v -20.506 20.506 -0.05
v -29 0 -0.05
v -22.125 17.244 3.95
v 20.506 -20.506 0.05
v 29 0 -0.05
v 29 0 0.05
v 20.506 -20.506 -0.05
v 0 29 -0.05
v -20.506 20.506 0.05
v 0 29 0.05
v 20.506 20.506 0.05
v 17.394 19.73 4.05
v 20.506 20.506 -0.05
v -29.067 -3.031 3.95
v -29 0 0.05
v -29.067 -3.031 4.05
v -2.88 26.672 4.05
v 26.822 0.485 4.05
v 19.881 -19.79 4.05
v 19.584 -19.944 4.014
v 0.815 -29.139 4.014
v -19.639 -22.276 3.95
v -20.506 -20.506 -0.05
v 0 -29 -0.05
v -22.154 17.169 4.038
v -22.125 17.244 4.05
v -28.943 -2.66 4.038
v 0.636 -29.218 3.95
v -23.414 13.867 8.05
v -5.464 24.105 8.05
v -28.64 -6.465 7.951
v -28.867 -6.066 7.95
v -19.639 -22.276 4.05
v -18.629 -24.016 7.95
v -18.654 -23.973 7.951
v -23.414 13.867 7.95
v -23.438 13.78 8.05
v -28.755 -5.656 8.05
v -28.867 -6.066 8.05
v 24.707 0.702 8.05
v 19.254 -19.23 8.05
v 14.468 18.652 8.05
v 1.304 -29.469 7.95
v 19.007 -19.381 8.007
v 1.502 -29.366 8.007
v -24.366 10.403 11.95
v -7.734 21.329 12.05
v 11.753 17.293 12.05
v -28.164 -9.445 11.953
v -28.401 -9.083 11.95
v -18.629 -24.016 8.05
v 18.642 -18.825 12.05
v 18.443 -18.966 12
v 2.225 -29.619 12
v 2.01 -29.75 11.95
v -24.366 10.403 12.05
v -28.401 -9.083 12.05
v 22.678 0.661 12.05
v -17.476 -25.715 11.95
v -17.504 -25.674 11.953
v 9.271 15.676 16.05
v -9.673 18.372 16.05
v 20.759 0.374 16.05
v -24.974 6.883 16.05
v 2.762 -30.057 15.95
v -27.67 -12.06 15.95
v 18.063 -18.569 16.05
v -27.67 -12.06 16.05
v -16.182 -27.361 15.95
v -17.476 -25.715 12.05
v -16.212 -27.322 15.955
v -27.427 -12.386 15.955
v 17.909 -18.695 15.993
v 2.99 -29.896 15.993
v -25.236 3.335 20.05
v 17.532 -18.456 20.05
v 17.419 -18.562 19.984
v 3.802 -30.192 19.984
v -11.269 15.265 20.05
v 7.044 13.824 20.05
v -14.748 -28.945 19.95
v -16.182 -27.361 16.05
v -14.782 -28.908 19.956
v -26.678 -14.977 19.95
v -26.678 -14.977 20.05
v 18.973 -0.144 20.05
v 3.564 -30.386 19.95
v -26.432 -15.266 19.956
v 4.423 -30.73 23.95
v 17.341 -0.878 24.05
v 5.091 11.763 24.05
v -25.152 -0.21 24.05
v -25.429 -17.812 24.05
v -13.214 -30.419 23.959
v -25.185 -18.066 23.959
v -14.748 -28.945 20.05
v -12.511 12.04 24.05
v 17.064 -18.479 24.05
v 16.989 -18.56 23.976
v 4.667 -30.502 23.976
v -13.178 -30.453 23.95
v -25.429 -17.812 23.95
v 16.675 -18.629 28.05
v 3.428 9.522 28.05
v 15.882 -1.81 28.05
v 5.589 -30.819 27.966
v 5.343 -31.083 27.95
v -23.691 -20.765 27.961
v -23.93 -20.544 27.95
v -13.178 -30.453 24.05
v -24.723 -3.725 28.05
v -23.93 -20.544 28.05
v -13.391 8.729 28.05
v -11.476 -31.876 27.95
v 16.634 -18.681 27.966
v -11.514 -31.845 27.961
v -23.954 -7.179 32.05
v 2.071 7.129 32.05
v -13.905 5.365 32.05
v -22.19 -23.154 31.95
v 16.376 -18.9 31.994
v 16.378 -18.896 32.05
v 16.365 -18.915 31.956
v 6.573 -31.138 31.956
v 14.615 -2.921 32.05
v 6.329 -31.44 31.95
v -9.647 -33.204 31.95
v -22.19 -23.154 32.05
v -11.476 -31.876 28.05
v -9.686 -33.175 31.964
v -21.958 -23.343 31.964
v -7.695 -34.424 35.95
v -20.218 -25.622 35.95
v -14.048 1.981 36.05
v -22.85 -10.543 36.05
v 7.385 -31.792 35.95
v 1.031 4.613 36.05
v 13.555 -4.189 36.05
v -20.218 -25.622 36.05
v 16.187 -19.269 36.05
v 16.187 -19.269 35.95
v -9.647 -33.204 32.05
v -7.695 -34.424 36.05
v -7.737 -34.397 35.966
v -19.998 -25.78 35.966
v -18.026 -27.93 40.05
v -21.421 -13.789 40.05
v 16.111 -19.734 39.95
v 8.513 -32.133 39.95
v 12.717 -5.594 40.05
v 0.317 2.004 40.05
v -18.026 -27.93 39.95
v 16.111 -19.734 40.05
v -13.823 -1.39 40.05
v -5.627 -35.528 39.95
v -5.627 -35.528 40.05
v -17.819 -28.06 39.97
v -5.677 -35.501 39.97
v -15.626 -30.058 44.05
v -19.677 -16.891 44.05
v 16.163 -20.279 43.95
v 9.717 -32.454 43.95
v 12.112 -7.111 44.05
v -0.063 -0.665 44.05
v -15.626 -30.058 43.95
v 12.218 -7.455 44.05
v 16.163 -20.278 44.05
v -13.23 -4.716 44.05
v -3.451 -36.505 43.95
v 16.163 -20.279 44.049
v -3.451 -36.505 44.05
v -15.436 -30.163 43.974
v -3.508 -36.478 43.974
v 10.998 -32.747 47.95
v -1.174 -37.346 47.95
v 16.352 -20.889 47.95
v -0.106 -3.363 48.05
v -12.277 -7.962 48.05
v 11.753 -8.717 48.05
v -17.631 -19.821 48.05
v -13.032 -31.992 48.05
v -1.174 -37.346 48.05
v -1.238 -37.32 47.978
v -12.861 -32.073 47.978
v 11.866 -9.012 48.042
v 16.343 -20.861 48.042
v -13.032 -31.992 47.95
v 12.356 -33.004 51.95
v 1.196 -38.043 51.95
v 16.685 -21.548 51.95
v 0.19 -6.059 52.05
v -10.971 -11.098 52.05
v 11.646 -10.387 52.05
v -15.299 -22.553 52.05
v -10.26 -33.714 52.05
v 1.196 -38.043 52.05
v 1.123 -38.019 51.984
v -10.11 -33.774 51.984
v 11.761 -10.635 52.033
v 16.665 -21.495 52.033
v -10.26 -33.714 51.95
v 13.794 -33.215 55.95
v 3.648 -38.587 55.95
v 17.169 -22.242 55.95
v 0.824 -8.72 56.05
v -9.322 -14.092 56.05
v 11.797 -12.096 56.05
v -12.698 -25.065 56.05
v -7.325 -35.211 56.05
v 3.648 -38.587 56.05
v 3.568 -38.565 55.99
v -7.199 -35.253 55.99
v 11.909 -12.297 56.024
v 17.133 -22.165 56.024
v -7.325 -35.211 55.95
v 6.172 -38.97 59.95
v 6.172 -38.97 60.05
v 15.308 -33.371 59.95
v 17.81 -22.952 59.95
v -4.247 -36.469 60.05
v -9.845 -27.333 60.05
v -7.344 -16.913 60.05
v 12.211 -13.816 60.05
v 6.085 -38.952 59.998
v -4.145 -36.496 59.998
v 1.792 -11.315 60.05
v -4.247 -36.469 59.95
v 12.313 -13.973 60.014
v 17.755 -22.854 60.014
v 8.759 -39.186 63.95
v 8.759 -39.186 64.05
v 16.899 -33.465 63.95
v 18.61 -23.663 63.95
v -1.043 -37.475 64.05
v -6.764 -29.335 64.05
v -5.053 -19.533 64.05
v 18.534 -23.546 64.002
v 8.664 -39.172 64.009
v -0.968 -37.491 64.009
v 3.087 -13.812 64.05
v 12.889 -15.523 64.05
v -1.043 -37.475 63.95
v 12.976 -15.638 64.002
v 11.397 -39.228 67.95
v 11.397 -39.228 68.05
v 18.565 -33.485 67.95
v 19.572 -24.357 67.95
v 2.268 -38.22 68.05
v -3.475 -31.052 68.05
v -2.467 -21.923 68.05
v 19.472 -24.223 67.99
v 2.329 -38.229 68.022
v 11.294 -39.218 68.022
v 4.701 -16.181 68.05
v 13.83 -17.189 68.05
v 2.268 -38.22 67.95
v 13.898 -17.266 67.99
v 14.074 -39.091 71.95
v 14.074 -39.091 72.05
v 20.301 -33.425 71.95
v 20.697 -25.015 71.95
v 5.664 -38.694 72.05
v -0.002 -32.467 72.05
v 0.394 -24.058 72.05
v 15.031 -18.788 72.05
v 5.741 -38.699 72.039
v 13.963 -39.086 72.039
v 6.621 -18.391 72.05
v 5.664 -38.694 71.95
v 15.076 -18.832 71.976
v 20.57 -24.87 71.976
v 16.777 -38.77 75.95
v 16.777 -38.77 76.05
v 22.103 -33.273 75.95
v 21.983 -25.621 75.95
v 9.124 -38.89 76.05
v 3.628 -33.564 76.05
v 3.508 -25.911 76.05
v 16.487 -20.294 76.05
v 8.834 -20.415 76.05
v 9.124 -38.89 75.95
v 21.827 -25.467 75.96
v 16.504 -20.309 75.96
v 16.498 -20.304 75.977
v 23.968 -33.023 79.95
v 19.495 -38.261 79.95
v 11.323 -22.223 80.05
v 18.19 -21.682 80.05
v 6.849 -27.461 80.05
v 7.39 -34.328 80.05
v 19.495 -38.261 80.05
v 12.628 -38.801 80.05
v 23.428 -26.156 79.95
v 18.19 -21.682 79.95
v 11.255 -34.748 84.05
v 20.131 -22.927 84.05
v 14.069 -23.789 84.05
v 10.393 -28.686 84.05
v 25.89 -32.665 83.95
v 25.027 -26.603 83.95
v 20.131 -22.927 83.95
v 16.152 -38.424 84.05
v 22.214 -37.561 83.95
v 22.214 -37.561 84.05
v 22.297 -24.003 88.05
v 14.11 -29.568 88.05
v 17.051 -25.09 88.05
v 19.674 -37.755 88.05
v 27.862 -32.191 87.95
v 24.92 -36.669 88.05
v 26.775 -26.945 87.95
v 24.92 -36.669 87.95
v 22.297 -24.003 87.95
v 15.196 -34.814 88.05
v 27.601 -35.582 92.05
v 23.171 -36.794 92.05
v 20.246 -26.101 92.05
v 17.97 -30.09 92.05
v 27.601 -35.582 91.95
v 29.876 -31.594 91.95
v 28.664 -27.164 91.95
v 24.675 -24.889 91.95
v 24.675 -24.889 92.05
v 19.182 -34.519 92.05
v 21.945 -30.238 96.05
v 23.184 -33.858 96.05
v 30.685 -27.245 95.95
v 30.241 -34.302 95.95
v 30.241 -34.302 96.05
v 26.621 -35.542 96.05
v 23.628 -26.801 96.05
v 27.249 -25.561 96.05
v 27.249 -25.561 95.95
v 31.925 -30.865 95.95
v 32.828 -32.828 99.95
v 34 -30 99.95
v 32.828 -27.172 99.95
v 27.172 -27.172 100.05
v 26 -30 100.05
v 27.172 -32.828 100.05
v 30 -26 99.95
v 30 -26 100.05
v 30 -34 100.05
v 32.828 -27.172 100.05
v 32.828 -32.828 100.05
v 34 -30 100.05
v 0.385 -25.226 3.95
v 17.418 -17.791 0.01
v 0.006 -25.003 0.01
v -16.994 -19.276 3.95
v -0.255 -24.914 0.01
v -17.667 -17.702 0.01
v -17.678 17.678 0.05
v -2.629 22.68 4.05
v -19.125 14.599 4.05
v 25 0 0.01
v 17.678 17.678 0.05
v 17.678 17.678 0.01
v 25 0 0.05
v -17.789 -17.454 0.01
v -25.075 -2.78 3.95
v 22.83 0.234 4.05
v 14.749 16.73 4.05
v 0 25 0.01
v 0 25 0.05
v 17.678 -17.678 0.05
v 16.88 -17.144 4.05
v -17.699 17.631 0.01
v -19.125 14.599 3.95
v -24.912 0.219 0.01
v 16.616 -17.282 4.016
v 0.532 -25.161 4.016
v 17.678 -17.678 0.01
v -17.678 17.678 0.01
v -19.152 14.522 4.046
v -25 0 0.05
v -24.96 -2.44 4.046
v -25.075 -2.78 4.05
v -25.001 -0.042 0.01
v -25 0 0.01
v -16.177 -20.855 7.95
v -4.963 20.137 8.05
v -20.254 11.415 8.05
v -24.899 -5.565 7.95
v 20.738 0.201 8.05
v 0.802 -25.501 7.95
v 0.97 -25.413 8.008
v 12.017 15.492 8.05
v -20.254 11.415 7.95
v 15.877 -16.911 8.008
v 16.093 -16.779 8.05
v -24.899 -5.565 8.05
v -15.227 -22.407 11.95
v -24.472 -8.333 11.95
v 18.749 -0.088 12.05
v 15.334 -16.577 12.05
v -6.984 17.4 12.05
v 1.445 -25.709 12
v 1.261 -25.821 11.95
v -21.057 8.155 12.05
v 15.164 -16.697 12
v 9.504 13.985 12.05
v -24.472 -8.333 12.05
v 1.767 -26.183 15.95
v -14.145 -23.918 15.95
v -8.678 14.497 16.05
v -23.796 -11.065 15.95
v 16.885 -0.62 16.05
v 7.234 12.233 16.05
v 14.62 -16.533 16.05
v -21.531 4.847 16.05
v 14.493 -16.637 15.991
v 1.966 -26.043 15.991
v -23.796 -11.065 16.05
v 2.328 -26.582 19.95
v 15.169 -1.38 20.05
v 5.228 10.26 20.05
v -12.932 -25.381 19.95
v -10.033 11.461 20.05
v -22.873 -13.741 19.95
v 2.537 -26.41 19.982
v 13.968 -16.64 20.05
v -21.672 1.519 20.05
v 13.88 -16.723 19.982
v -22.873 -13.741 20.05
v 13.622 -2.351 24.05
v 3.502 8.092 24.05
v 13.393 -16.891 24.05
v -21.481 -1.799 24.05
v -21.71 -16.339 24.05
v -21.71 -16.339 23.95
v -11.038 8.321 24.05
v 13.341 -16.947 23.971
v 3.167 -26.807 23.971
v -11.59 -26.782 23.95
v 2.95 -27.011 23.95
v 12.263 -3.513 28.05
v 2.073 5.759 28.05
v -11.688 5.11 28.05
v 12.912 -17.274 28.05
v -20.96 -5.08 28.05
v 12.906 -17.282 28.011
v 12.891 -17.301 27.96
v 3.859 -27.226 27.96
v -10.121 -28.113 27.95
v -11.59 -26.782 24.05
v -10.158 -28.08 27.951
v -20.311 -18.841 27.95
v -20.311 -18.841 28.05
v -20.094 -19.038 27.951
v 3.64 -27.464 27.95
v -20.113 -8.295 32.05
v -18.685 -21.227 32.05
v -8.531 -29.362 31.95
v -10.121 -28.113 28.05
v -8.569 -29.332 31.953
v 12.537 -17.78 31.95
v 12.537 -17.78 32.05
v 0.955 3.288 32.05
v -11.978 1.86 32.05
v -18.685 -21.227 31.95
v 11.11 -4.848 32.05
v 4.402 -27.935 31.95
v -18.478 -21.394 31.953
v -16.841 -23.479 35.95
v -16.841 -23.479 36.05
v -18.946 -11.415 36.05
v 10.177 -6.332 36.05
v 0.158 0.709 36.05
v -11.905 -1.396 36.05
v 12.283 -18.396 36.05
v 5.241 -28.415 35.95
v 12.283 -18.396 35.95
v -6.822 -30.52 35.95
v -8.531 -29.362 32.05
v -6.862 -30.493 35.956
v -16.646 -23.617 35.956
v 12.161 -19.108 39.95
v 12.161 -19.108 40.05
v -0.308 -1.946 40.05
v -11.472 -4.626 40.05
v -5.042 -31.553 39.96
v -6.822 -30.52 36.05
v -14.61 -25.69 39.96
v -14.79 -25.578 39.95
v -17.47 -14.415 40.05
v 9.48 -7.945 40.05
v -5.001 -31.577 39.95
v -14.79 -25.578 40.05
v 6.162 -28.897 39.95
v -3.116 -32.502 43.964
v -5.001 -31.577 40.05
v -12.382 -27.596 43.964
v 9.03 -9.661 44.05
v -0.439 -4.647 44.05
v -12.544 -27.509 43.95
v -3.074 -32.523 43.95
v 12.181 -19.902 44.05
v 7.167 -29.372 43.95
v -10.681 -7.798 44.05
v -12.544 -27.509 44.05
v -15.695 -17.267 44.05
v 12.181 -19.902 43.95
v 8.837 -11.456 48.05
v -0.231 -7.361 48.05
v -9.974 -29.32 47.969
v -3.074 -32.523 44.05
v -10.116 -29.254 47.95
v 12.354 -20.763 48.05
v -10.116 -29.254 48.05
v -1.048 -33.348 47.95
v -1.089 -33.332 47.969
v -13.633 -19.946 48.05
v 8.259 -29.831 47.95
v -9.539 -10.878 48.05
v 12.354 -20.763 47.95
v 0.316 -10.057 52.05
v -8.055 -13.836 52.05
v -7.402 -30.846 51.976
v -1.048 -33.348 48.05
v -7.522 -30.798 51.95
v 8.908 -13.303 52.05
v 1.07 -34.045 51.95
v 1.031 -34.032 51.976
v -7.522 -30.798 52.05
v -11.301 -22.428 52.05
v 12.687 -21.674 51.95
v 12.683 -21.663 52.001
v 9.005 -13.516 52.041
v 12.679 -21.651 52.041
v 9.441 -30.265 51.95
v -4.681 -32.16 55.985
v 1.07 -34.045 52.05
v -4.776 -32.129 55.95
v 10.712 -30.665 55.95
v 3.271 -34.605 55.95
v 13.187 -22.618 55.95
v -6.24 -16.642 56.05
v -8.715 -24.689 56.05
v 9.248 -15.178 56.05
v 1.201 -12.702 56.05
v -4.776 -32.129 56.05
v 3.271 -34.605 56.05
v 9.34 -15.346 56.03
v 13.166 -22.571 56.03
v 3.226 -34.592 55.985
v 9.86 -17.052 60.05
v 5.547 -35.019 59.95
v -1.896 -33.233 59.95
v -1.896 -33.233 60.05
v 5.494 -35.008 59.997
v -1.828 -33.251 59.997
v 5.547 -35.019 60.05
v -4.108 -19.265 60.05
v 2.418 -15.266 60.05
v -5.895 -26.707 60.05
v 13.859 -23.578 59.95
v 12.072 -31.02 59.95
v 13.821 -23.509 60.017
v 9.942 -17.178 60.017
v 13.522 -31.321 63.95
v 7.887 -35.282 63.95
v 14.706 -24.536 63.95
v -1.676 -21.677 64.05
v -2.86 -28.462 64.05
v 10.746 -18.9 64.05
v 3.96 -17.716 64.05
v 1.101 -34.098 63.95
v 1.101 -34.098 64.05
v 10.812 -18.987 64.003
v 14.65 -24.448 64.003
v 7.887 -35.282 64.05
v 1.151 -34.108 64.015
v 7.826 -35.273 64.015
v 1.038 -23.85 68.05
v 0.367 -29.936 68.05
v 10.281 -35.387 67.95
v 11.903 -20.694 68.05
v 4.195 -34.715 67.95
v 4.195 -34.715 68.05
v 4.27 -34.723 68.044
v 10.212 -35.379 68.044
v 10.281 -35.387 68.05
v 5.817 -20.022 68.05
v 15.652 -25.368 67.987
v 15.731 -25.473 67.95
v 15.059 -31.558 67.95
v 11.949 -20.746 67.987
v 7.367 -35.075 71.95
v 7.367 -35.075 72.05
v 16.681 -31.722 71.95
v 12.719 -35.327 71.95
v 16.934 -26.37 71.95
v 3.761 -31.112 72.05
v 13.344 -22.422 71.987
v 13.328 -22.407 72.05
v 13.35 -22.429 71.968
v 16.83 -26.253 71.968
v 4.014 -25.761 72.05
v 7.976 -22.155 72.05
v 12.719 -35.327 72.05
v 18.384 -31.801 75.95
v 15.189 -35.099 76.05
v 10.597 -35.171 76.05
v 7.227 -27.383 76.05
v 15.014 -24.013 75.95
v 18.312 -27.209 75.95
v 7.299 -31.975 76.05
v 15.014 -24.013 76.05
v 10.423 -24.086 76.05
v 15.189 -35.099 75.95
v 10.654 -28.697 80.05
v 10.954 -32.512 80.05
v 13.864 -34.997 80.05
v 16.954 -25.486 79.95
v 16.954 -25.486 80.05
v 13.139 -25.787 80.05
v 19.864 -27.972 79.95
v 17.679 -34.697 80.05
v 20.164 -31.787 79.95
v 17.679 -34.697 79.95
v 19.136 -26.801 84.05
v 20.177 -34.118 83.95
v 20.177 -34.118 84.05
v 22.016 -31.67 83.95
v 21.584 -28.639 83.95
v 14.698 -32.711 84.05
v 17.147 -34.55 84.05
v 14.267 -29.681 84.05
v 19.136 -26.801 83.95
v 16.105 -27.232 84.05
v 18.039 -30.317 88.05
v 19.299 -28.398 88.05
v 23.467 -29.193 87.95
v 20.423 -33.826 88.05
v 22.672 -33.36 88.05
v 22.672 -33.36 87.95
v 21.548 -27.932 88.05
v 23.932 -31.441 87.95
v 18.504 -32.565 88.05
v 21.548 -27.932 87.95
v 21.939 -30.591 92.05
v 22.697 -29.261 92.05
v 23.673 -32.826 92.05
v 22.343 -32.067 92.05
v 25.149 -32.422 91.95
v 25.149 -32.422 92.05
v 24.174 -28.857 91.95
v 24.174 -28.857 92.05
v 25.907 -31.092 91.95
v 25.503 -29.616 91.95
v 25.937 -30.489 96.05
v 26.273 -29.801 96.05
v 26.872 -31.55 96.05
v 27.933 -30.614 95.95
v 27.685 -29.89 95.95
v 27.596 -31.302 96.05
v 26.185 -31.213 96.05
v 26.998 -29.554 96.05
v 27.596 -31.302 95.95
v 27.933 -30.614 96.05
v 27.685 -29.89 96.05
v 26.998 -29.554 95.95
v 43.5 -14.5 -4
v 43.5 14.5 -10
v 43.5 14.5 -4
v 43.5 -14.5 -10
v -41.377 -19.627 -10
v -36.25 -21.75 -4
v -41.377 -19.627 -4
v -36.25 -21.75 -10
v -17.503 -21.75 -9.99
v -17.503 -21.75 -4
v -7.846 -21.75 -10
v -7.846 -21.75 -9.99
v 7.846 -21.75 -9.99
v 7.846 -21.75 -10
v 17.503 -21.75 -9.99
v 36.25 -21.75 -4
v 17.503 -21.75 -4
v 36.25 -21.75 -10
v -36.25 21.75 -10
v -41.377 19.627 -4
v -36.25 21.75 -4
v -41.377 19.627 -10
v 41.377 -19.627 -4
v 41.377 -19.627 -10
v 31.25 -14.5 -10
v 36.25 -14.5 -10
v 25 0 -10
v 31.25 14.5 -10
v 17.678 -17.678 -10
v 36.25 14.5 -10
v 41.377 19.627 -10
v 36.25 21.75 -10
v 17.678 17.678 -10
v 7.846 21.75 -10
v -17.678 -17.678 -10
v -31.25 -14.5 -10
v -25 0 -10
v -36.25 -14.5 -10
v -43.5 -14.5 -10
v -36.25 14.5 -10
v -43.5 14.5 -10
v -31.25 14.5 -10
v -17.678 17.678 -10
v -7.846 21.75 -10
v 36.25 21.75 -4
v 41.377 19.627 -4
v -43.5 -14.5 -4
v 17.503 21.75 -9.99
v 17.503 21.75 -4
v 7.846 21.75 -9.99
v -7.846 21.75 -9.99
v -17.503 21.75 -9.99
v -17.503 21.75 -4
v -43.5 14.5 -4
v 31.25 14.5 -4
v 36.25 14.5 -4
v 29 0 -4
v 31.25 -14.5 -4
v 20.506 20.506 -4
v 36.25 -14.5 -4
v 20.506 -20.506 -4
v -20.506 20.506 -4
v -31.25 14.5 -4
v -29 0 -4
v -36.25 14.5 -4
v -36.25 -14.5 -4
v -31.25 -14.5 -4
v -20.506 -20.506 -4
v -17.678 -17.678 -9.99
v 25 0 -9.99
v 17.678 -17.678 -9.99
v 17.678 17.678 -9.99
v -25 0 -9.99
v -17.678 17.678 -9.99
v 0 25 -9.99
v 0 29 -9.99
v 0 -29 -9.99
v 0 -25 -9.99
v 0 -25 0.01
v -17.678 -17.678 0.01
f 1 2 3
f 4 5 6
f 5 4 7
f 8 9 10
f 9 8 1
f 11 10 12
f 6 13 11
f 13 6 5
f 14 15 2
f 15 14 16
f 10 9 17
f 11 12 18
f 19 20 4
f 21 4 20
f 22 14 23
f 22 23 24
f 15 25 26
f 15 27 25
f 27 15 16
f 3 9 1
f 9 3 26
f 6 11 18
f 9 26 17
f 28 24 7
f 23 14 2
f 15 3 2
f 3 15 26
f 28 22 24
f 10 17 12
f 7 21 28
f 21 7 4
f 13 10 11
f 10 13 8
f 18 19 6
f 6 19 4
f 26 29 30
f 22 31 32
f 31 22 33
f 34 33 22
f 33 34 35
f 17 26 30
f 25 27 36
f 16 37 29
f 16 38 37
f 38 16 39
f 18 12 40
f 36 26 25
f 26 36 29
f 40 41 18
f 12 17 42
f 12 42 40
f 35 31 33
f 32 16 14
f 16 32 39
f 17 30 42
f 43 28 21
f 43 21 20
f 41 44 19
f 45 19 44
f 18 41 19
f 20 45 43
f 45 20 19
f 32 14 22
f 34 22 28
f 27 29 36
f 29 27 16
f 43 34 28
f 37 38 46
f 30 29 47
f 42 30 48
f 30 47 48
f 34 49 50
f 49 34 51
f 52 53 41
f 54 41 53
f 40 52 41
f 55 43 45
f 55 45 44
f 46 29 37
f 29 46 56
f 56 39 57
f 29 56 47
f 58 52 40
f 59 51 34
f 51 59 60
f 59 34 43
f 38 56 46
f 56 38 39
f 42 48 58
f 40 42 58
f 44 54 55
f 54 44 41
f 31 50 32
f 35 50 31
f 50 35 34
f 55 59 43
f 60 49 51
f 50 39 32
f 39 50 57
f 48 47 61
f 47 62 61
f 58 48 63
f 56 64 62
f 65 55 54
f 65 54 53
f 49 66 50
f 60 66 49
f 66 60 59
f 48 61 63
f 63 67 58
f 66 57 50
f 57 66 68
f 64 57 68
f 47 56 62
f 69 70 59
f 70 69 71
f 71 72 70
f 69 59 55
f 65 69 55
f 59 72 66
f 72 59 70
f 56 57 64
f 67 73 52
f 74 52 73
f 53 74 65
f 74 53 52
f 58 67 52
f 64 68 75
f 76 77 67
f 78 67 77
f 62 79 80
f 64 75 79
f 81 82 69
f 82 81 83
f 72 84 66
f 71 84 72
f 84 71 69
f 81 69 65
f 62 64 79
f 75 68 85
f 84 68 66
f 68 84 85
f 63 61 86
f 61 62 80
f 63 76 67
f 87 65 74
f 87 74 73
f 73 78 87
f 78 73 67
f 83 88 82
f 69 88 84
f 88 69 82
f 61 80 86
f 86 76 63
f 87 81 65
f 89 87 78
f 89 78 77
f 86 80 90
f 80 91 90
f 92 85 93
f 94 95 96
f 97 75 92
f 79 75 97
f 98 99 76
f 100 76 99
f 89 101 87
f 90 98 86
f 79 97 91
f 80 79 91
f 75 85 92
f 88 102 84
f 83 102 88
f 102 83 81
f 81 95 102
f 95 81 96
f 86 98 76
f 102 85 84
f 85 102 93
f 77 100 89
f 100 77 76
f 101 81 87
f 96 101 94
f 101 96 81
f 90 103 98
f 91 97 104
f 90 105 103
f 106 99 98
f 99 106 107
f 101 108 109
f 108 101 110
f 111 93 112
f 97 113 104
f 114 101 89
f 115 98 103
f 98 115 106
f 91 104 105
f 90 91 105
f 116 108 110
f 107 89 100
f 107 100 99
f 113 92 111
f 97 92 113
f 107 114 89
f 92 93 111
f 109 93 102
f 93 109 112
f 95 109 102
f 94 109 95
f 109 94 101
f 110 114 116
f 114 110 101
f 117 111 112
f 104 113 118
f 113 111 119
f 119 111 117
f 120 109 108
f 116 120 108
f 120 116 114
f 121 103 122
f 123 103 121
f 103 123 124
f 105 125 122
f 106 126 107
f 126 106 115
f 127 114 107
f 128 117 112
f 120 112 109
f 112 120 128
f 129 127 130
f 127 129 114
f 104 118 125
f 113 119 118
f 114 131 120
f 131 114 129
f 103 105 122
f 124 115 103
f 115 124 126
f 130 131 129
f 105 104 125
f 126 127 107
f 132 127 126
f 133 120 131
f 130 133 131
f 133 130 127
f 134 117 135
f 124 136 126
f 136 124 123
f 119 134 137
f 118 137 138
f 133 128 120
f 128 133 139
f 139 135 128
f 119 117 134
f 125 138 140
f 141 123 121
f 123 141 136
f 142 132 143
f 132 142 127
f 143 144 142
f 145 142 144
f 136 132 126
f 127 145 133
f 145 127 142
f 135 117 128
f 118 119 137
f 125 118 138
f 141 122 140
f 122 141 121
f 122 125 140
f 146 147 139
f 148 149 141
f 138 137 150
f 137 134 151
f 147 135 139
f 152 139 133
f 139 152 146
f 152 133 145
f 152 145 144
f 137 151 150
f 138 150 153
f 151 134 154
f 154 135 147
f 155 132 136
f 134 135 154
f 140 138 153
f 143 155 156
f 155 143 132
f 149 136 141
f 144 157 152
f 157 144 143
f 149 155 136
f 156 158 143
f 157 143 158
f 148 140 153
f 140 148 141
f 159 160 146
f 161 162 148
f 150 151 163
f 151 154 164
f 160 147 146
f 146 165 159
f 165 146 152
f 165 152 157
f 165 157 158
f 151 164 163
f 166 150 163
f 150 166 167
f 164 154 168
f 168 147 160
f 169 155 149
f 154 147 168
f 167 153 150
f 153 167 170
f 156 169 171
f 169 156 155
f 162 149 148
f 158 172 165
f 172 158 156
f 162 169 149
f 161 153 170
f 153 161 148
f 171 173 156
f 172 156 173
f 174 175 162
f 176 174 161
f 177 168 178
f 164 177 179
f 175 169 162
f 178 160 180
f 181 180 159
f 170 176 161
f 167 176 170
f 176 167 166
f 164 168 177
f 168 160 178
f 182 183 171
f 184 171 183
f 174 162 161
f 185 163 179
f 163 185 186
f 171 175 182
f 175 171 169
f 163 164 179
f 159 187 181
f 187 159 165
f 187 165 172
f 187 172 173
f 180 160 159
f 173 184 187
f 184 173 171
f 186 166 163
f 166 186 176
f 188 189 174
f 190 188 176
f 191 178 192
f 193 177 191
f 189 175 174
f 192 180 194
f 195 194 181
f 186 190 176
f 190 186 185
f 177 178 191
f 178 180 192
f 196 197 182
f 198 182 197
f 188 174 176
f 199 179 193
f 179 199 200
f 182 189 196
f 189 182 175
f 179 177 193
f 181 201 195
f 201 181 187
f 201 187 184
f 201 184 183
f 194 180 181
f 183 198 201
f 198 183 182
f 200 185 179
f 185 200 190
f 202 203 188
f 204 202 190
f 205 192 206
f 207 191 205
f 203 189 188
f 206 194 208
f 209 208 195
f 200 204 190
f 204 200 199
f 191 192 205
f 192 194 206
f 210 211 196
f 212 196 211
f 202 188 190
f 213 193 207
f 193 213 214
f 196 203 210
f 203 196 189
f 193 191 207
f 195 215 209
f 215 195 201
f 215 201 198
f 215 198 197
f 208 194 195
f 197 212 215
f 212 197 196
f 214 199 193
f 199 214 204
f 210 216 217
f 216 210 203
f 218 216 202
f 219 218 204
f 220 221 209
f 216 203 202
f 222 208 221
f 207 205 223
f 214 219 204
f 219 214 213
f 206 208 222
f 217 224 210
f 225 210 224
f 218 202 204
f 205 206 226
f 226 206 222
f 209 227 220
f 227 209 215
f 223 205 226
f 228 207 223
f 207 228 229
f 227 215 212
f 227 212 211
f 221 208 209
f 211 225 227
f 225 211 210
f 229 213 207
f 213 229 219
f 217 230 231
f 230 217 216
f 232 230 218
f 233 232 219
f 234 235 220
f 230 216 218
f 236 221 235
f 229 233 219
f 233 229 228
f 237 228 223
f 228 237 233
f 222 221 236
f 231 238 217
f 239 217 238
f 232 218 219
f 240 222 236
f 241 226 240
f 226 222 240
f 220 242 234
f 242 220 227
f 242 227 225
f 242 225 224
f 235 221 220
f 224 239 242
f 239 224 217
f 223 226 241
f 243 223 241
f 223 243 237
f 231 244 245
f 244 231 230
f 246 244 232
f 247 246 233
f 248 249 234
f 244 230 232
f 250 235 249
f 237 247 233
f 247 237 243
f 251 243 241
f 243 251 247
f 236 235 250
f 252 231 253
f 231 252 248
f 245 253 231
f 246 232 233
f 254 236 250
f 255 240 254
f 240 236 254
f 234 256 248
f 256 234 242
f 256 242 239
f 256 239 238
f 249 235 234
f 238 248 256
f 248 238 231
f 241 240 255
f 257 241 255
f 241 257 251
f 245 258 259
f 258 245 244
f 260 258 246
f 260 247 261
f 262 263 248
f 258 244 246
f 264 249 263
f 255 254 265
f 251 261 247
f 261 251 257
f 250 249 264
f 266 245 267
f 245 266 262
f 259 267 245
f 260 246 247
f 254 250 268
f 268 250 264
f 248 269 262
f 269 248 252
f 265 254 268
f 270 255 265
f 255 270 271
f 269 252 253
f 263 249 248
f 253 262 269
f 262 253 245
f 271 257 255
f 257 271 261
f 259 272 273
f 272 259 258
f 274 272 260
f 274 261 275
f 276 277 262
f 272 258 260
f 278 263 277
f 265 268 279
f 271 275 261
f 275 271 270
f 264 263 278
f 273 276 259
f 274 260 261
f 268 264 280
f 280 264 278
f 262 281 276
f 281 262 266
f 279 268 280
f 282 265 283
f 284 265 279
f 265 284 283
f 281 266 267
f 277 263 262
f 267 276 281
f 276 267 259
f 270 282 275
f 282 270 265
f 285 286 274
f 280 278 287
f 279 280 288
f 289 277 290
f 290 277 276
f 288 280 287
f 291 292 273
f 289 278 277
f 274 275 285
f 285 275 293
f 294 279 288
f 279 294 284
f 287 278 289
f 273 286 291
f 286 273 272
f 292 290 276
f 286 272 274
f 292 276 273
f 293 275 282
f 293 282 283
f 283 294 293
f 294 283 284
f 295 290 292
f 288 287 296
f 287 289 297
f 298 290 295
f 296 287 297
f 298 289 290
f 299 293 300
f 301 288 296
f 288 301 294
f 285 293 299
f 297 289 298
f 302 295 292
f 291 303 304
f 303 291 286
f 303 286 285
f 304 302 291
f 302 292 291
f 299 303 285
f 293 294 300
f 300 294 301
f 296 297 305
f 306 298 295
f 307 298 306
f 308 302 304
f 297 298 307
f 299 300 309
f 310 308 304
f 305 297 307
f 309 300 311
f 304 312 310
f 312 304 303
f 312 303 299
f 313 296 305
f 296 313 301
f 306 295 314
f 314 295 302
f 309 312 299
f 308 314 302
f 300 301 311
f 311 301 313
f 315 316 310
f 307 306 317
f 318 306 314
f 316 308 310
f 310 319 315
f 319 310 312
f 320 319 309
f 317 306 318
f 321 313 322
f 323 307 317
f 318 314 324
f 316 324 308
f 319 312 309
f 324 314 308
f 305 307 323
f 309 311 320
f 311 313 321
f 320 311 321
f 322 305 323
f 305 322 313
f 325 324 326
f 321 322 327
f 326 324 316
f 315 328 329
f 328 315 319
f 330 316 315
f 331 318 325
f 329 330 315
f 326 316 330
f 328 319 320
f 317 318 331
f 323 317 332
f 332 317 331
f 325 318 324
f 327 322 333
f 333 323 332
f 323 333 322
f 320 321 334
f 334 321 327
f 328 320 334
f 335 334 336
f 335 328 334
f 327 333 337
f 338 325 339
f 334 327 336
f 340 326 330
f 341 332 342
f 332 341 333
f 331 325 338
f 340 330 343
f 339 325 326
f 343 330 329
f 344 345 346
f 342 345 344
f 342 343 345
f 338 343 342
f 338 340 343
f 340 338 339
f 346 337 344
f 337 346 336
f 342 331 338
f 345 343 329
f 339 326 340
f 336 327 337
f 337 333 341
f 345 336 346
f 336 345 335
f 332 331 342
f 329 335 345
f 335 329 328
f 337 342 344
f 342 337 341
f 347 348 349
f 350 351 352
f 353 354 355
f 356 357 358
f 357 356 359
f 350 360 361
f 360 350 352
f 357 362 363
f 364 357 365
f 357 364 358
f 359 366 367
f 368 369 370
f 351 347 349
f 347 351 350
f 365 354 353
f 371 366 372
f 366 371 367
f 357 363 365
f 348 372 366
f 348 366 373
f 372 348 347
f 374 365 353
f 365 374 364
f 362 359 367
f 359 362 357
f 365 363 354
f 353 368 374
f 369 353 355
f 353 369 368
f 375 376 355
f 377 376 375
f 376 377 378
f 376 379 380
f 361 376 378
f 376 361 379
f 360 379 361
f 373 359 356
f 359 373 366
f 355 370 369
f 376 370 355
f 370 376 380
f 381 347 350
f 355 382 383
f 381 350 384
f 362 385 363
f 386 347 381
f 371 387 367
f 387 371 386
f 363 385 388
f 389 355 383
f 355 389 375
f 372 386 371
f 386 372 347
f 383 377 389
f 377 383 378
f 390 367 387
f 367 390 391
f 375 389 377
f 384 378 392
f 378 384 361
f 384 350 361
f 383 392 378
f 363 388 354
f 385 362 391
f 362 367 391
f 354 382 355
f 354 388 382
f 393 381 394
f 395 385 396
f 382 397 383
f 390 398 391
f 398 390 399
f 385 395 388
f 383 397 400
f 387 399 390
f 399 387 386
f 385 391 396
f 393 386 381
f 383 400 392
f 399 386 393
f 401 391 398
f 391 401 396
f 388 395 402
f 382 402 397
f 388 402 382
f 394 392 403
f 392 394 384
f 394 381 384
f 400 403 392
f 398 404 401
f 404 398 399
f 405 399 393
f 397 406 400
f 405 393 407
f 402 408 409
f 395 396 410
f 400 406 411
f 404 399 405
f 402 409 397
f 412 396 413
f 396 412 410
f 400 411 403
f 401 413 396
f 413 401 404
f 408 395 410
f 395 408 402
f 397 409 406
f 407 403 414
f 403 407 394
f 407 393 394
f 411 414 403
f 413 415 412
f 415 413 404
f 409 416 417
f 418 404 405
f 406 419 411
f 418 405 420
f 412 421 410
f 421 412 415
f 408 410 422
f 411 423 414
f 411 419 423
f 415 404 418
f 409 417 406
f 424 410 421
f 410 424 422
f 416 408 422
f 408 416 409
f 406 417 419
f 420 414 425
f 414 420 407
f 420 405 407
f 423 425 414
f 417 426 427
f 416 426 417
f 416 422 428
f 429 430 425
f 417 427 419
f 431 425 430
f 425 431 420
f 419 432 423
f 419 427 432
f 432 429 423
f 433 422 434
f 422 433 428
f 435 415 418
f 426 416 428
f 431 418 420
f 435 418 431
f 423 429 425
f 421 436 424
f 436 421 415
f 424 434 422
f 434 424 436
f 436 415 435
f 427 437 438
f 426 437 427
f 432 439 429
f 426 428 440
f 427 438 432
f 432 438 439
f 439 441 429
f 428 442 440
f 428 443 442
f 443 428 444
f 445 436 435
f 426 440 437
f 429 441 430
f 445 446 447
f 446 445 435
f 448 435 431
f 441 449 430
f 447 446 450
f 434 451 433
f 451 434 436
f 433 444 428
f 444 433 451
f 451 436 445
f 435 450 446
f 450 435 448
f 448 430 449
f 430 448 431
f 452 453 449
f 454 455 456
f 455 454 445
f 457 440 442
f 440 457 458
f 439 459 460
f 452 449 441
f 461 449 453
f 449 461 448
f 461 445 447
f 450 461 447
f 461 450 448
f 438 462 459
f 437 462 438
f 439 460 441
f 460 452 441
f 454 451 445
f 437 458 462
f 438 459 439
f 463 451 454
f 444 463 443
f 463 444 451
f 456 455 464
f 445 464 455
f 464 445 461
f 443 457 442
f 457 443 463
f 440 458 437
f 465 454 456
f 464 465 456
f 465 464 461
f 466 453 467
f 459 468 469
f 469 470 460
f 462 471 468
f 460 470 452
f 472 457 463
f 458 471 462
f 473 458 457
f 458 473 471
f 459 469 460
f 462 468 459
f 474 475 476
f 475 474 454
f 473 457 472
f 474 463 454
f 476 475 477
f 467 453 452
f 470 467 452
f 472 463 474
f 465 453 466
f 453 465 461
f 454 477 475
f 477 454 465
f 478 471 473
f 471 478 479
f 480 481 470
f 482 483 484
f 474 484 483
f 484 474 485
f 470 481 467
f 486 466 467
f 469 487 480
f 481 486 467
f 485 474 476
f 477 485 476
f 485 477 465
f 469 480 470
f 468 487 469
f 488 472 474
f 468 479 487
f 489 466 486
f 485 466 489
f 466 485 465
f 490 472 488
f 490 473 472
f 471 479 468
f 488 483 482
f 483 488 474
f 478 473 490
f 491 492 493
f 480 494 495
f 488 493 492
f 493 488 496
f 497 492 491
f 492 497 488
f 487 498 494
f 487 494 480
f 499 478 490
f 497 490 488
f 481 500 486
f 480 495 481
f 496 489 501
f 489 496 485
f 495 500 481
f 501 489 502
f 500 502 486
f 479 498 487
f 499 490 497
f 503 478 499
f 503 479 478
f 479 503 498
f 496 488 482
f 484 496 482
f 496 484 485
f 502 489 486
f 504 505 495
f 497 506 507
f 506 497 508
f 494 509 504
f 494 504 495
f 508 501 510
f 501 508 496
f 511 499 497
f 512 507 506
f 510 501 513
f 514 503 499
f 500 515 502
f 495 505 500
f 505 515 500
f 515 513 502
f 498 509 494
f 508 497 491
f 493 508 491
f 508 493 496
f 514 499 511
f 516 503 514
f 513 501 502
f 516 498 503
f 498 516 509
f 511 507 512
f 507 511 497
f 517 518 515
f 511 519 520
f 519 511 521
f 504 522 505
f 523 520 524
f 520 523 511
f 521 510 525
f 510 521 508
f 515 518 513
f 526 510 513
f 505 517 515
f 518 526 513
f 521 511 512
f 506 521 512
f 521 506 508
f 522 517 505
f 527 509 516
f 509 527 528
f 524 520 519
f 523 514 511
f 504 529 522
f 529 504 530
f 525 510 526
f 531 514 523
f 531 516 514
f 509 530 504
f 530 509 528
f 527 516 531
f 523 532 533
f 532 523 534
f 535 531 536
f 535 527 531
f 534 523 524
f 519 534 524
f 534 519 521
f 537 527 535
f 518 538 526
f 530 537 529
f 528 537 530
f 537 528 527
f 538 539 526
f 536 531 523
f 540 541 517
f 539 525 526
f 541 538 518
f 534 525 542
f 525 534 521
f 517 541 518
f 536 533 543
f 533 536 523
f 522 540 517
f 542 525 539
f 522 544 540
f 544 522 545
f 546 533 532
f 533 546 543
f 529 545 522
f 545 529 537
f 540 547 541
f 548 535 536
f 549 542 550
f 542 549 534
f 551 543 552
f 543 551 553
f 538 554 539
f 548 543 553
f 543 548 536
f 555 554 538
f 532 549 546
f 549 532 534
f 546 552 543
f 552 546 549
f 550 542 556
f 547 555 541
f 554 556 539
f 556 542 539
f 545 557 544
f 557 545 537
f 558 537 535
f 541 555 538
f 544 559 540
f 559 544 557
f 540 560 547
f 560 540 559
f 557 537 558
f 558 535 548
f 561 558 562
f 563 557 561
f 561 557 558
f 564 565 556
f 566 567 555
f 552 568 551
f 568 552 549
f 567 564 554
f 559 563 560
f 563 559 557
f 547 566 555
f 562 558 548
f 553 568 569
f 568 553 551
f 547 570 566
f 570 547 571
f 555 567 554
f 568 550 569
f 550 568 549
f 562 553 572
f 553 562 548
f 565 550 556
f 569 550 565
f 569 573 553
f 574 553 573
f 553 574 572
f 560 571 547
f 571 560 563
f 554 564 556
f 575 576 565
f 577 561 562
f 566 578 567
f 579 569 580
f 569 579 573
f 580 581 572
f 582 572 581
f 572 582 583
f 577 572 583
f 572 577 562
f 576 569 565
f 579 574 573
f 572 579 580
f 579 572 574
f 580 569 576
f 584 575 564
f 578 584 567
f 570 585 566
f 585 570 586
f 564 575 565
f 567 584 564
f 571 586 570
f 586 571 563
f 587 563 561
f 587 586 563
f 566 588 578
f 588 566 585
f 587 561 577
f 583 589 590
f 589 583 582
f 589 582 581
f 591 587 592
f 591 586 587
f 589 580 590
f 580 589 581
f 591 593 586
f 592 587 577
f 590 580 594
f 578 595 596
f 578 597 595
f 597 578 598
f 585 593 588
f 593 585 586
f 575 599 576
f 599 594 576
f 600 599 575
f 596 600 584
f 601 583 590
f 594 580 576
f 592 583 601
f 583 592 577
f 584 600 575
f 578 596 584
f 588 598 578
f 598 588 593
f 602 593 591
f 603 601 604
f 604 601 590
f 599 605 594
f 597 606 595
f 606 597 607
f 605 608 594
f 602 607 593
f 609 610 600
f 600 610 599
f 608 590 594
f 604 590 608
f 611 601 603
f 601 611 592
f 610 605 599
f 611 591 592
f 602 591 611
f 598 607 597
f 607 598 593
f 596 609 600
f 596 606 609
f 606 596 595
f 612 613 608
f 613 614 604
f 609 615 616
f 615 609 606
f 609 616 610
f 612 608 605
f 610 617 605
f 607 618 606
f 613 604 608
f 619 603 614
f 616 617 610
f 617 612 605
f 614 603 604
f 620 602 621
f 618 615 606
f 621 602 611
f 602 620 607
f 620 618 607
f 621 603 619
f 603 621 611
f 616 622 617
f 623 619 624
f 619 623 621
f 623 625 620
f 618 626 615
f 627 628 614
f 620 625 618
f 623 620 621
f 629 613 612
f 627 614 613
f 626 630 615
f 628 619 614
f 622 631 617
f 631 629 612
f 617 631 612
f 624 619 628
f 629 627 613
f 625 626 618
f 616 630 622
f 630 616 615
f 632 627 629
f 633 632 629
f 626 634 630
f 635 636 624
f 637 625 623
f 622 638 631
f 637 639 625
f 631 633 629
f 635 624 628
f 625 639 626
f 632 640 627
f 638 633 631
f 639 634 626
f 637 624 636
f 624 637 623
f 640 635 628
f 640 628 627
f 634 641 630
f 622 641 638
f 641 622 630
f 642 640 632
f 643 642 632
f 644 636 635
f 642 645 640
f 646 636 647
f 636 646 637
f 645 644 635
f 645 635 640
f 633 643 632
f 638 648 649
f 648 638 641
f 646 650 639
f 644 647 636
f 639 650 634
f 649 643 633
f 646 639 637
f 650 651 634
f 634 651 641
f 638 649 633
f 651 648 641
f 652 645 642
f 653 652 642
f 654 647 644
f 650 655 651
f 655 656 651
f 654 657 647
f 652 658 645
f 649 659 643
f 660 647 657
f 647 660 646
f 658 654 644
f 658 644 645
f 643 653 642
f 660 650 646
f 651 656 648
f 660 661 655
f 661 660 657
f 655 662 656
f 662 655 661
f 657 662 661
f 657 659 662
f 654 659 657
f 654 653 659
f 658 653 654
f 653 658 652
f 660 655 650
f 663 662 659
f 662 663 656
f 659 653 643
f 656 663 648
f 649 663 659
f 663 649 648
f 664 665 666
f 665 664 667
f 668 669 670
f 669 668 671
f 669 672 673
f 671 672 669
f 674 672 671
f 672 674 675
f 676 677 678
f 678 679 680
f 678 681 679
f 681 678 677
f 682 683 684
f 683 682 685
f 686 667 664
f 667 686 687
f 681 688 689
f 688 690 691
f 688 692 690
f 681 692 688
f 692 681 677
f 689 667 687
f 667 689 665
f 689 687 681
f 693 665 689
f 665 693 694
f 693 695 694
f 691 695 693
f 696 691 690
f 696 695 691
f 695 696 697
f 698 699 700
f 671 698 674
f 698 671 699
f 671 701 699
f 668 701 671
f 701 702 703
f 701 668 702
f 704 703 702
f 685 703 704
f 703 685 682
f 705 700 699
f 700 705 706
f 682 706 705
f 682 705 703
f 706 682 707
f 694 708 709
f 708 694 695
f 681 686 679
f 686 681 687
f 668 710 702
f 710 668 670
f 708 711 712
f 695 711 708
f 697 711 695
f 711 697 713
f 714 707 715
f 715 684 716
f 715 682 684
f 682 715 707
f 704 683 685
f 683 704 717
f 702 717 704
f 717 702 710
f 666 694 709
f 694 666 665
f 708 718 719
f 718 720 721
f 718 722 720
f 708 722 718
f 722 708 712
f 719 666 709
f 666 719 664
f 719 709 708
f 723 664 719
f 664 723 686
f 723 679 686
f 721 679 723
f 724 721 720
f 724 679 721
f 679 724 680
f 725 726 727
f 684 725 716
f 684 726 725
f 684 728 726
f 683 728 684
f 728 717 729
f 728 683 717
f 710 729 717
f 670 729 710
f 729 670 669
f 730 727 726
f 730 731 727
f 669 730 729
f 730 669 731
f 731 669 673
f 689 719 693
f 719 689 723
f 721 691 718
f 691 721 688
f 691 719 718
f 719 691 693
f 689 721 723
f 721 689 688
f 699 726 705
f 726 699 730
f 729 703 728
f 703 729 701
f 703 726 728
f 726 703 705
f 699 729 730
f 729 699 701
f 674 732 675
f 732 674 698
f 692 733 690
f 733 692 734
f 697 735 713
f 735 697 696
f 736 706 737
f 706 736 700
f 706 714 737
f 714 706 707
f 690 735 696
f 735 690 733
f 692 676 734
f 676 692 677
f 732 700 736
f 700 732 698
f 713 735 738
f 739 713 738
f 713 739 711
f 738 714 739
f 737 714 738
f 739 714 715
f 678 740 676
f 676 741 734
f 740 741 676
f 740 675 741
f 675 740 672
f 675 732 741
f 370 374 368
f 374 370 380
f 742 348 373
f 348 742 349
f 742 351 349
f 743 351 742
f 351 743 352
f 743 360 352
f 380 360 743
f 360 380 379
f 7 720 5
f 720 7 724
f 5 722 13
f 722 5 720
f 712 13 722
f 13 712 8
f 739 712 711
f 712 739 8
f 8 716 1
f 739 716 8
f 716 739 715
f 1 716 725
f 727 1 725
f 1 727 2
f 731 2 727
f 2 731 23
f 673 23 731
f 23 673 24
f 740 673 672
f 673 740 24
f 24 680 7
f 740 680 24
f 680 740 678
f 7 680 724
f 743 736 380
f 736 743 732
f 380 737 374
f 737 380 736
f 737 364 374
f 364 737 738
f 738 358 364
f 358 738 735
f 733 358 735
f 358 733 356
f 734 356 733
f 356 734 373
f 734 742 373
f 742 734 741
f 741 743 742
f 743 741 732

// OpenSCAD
//	   Customizable Horn with TAB and constant wall thickness
//		    Steven Veltema
//		    September 18, 2015
//
//      With inspiration from:
//	    Customizable Horn - Steve Medwin
//      http://www.thingiverse.com/thing:347425
//
//      And Adafruit LED Fire Horns
//      http://www.thingiverse.com/thing:344412

//higher = smoother, larger files
HORN_FACE_NUMBER = 8; //[6:1:100]

HORN_LENGTH=100.0;// [10:5:300]
//base inner radius
HORN_INNER_RADIUS=25.0;// [10:1:100]
//constant across horn height
HORN_WALL_THICKNESS=4.0;//	[1:1:50]

HORN_TWIST_X_AXIS=0;// [-720:5:720]
HORN_TWIST_Y_AXIS=0; // [-720:5:720]
HORN_TWIST_Z_AXIS=90;// [-720:5:720]

HORN_TIP_OFFSET_X=-30.0;// [-100:5:100]
HORN_TIP_OFFSET_Y=-30.0;// [-100:5:100]
HORN_ROTATE = 0.0;// [0:5:360]

//lower = more detailed, larger files
HORN_VERT_RESOLUTION = 4.0;//[2:1:10]

BASE_HEIGHT = 10.0; // [2:1:100]

INCLUDE_TAB = "true"; // [true,false]
TAB_HEIGHT = 5; // [2:1:10]
TAB_ROTATE = 0.0;// [0:5:360]

$fn = HORN_FACE_NUMBER;

module ring(inner_rad, height){
    linear_extrude(height = height, center = false){
        difference() {
            circle(r = inner_rad+HORN_WALL_THICKNESS);
            circle(r = inner_rad);
        }
    }
}
 
module base() {
    translate([0,0,-BASE_HEIGHT+0.01])  rotate([0,0,HORN_ROTATE]) ring(HORN_INNER_RADIUS,BASE_HEIGHT);
}

module TAB() {
    shortSide = HORN_INNER_RADIUS+HORN_WALL_THICKNESS;
    longSide = shortSide*2.5;
    height          = TAB_HEIGHT;
    TABHoleDepth = TAB_HEIGHT;
    
    difference() {
       translate([-longSide/2,-shortSide/2,-BASE_HEIGHT]){
            minkowski() {
                cube(size=[longSide,shortSide,height]);
                cylinder(r=shortSide/4);
            }
         }
      
         translate([longSide-longSide/2-TABHoleDepth,-shortSide/2,-height-BASE_HEIGHT]) cube(size=[TABHoleDepth,shortSide,height*4]);
         translate([-longSide/2,-shortSide/2,-height-BASE_HEIGHT]) cube(size=[TABHoleDepth,shortSide,height*4]);
        
        rotate([0,180,0]) translate(0,0,-height) cylinder(h=height*3,r=HORN_INNER_RADIUS);
    }
}

module horn()
{
    fn=floor(HORN_LENGTH/HORN_VERT_RESOLUTION);
        
    twistX = HORN_TWIST_X_AXIS/fn;
    twistY = HORN_TWIST_Y_AXIS/fn;
    twistZ = HORN_TWIST_Z_AXIS/fn;
    
    offsetX = HORN_TIP_OFFSET_X/fn;
    offsetY = HORN_TIP_OFFSET_Y/fn;
    offsetZ = HORN_LENGTH/fn;
    
    rotate([0,0,HORN_ROTATE]) {    
       difference() {
           //outershell
            for (i=[0:fn-1]) {                
                hull() { 
                    rotate([twistX*i,twistY*i,twistZ*i])
                        translate([offsetX*i,offsetY*i,offsetZ*i])
                            linear_extrude(height = 0.1, center = true, convexity = 10, twist = 0)
                                circle(HORN_INNER_RADIUS+HORN_WALL_THICKNESS-(i*(HORN_INNER_RADIUS)/fn));
          
                    rotate([twistX*(i+1),twistY*(i+1),twistZ*(i+1)])
                        translate([offsetX*(i+1),offsetY*(i+1),offsetZ*(i+1)])
                            linear_extrude(height = 0.1, center = true, convexity = 10, twist = 0)
                                circle(HORN_INNER_RADIUS+HORN_WALL_THICKNESS-((i+1)*(HORN_INNER_RADIUS)/fn));                   
                 }
            }
           //innershell
             for (i=[0:fn-1]) {                
                hull() { 
                    lowerOffsetZ = offsetZ*i;
                    if (i==0) {lowerOffsetZ = lowerOffsetZ - 0.1;} //make sure base hole is properly removed
                    rotate([twistX*i,twistY*i,twistZ*i])
                        translate([offsetX*i,offsetY*i,lowerOffsetZ])
                            linear_extrude(height = 0.1, center = true, convexity = 10, twist = 0)
                                circle(HORN_INNER_RADIUS-(i*(HORN_INNER_RADIUS)/fn));
          
                    rotate([twistX*(i+1),twistY*(i+1),twistZ*(i+1)])
                        translate([offsetX*(i+1),offsetY*(i+1),offsetZ*(i+1)])
                            linear_extrude(height = 0.1, center = true, convexity = 10, twist = 0)
                                circle(HORN_INNER_RADIUS-((i+1)*(HORN_INNER_RADIUS)/fn));

                }
            }
        } //diff
    } //rotate
}

union() {
    horn();
    base();
    if (INCLUDE_TAB != "false") {
        rotate([0,0,TAB_ROTATE]) TAB();
    }
}
